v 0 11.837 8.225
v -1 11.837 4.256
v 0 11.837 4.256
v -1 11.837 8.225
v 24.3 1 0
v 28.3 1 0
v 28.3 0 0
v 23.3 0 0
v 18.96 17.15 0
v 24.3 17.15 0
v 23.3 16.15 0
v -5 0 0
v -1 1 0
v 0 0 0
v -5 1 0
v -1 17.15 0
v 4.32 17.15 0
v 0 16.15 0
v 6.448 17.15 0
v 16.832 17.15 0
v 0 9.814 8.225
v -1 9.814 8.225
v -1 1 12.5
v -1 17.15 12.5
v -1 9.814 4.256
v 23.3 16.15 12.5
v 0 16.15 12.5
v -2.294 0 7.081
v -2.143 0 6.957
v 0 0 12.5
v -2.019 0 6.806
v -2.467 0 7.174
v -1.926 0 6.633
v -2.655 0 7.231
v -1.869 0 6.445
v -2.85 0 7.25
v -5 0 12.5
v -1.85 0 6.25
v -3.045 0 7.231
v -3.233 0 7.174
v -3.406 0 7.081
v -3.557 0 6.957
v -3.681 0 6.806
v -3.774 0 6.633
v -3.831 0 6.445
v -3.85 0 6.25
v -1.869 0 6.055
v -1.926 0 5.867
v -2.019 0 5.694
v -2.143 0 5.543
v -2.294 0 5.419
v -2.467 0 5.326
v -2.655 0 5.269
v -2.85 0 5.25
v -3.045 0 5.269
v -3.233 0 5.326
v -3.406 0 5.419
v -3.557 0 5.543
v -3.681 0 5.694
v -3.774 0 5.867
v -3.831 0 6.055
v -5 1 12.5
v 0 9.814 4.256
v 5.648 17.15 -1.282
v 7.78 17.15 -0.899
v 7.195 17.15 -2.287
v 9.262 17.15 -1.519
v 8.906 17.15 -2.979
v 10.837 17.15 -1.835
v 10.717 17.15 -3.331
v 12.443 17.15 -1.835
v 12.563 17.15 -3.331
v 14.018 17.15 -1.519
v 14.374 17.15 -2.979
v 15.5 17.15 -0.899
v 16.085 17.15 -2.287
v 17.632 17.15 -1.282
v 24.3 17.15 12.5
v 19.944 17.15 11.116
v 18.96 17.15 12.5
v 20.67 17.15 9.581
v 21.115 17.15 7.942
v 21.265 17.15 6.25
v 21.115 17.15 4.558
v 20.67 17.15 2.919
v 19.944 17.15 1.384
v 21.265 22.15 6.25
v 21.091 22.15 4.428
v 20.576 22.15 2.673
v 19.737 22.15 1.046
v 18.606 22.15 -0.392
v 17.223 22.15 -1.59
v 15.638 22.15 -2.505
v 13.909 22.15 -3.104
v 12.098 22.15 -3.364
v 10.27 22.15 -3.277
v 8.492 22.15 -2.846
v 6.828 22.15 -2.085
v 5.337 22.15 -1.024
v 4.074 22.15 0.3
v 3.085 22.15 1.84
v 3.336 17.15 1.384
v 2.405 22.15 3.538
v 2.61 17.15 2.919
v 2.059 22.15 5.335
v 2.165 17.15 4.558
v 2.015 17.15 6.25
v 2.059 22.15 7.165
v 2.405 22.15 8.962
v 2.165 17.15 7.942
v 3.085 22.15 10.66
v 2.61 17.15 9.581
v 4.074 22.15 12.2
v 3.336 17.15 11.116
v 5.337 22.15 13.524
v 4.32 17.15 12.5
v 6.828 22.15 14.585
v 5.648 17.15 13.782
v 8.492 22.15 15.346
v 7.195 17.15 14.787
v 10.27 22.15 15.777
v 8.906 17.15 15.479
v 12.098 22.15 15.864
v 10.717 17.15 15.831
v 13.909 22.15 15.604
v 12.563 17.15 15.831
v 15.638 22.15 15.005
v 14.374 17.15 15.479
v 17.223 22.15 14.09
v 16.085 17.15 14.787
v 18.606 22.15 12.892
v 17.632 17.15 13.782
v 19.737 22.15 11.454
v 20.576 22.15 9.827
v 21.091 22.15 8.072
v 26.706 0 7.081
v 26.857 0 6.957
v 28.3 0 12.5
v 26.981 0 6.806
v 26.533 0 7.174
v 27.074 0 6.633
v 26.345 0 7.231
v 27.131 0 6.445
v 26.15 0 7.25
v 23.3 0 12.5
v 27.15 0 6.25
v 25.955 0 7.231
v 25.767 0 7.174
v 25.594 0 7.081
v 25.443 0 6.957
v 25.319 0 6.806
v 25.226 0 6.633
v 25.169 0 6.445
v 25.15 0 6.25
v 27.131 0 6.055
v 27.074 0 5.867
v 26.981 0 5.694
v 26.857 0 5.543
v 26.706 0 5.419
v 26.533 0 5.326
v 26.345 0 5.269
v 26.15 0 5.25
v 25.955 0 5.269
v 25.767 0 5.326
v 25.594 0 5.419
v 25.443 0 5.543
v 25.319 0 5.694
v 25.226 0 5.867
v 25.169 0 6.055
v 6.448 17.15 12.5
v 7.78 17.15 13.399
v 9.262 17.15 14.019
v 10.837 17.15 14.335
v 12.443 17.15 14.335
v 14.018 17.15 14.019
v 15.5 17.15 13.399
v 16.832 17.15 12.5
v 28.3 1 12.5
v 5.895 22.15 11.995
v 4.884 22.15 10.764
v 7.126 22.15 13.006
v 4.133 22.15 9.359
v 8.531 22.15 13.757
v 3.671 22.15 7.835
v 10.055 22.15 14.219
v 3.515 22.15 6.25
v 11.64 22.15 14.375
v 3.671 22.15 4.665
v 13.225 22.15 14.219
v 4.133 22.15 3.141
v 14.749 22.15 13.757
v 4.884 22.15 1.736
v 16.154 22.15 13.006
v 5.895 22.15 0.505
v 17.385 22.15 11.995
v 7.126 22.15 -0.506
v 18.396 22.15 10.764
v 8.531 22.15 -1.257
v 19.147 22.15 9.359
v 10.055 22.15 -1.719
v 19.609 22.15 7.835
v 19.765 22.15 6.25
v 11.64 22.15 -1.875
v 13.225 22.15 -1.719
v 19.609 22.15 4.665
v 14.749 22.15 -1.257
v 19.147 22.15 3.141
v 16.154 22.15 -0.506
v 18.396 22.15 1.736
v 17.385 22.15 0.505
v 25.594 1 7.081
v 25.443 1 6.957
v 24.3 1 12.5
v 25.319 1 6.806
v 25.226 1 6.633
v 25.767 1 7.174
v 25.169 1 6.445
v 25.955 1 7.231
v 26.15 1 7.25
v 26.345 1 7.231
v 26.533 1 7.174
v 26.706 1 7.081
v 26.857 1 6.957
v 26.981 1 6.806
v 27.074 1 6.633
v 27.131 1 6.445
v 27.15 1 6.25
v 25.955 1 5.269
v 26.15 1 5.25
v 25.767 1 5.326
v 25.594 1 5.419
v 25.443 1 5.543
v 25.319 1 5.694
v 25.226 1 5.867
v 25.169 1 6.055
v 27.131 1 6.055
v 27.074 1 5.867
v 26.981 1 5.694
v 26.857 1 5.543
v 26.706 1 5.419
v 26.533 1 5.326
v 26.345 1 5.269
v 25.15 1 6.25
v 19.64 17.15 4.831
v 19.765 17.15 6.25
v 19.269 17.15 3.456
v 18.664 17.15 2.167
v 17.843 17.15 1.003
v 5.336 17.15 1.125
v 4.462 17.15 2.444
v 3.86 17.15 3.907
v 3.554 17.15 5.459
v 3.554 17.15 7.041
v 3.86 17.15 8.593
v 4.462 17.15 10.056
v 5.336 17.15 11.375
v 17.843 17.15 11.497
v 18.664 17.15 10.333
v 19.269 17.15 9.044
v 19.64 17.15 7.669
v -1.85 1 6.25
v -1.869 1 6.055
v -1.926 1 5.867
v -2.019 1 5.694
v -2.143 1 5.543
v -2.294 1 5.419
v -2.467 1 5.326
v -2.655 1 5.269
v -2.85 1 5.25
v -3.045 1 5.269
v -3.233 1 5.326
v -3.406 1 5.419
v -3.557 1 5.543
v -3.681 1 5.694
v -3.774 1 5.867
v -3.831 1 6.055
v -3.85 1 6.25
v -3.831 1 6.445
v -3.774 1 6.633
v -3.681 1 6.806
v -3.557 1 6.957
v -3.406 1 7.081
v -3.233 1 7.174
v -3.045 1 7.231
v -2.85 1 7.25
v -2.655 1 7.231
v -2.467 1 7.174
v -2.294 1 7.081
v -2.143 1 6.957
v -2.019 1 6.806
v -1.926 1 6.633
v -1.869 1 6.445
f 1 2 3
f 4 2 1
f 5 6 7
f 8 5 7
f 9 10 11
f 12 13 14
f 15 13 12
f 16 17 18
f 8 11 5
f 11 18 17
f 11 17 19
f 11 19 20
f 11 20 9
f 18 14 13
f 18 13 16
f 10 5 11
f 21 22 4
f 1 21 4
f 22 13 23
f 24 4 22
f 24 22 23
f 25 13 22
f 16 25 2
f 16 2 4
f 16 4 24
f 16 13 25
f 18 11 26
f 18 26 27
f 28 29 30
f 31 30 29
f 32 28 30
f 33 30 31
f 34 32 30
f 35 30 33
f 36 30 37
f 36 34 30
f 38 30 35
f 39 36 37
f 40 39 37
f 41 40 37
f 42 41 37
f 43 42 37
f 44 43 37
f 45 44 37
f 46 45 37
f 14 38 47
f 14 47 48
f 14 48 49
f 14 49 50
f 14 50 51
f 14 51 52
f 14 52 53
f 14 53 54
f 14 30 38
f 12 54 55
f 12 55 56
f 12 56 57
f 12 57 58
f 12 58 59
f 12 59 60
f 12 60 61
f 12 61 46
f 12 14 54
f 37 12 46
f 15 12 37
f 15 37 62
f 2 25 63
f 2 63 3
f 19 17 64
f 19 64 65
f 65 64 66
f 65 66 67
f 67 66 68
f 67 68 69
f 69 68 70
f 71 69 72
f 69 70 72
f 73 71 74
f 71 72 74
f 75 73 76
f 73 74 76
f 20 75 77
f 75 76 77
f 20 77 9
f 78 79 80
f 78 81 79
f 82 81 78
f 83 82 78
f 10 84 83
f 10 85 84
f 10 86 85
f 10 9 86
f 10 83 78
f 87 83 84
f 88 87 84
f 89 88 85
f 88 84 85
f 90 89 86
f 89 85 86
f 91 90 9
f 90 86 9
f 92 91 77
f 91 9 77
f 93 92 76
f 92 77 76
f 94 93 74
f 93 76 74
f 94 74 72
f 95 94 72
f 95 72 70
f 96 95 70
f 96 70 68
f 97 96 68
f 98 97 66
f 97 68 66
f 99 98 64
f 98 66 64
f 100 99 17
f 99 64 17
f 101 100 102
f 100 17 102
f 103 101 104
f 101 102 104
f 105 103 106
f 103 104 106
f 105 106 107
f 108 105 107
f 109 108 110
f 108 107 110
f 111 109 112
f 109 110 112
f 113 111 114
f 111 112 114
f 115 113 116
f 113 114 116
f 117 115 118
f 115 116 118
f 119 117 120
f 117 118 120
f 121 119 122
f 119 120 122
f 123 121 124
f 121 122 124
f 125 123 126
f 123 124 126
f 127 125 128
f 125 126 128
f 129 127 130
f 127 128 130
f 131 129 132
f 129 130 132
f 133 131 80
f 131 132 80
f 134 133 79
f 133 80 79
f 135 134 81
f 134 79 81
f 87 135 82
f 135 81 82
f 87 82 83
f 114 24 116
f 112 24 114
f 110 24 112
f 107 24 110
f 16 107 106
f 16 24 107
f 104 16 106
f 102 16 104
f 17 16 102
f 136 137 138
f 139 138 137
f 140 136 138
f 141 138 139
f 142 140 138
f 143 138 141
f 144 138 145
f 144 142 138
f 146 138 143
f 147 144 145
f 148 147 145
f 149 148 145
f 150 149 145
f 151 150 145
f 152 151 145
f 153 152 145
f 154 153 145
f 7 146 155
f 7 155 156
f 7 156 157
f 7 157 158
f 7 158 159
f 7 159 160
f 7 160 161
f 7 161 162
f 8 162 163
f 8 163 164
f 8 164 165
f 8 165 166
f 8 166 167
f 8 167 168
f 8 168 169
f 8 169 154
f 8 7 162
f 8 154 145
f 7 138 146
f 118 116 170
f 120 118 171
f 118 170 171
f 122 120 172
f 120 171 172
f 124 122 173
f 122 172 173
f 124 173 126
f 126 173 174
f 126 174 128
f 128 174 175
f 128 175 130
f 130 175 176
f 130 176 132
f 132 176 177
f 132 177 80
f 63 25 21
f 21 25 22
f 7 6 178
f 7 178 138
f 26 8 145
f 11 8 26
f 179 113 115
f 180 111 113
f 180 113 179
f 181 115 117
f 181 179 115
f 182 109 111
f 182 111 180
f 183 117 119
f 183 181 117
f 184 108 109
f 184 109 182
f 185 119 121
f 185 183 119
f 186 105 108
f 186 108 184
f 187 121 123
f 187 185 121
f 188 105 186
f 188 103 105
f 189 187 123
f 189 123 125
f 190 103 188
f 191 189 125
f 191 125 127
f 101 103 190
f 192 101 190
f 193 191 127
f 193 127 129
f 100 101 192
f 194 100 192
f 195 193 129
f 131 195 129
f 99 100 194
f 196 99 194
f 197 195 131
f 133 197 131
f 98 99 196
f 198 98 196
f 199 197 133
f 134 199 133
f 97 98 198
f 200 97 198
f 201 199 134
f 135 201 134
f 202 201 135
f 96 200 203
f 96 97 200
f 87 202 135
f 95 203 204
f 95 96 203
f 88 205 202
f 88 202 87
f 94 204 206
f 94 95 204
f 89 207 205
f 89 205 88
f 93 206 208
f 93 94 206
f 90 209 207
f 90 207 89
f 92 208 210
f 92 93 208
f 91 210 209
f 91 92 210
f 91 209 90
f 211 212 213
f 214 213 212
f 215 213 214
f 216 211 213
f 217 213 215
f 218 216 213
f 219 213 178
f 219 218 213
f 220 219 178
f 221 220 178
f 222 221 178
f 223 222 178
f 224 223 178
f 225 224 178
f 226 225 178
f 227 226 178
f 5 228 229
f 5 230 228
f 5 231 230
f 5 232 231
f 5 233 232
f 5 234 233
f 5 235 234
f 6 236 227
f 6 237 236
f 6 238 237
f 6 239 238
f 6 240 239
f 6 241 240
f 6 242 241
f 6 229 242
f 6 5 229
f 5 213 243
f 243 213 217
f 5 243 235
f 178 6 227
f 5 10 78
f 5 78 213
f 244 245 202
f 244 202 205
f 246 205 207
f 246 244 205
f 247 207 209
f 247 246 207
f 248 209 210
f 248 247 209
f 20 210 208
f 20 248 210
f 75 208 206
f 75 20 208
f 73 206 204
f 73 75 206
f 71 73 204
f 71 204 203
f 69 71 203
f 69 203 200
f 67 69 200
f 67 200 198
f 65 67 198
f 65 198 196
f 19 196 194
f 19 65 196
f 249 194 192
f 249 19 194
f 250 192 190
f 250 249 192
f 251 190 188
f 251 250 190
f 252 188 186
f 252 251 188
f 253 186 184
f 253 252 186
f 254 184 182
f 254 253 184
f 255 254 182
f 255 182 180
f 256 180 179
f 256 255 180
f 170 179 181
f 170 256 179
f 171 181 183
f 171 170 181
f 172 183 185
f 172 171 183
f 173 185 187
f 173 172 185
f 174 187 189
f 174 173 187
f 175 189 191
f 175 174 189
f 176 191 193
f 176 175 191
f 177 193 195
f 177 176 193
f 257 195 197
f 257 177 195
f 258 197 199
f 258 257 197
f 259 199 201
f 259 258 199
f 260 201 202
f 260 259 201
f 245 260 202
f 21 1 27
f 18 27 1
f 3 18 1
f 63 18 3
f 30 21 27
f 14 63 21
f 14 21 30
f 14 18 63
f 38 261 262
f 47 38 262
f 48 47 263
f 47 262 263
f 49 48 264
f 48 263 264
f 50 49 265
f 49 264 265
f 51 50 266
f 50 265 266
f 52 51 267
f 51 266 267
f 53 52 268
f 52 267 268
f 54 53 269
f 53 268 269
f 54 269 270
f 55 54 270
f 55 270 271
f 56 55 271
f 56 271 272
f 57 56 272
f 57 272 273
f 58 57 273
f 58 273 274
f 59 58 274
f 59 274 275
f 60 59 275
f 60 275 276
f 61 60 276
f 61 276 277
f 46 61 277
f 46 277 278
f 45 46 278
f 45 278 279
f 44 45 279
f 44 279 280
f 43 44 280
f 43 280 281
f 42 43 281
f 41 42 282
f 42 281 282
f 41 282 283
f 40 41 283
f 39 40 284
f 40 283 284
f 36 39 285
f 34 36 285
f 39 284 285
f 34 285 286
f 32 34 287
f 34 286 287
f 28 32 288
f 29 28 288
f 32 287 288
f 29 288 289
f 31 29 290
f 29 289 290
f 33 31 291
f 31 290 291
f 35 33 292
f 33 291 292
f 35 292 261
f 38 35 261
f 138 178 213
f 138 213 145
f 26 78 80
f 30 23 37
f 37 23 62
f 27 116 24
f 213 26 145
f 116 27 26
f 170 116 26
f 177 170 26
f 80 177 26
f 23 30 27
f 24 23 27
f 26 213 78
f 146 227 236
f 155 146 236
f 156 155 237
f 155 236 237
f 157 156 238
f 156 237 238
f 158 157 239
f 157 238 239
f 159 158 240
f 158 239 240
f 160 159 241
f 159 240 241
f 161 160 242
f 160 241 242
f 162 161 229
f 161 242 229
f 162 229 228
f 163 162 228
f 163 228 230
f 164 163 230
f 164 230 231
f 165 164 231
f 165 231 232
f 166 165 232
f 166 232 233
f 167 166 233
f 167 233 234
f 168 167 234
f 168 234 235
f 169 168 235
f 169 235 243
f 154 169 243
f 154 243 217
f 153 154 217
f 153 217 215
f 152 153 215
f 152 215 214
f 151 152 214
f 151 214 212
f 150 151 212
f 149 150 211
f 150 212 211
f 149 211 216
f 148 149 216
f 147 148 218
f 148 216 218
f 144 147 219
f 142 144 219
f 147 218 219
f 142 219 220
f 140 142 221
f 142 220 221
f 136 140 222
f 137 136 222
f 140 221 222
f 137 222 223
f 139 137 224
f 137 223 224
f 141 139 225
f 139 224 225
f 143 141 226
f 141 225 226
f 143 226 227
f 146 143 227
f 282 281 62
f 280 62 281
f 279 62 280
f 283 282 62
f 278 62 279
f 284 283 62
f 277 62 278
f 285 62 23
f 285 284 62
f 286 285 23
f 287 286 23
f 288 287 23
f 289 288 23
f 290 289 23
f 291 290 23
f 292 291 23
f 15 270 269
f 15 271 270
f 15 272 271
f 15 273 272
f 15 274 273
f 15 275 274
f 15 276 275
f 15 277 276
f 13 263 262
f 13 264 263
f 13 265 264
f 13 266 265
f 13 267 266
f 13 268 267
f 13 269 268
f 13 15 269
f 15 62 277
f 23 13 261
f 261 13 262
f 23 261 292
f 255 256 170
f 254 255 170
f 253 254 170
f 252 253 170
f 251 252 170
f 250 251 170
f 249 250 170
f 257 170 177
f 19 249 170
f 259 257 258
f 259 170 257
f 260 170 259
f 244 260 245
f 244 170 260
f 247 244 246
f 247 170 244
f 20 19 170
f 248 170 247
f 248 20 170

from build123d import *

# Parameters (mm, degrees)
EKSTR_ZYON_NCE1_DEPTH       = 12.5
IZIM2_R                     = 1
KES_EKSTR_ZYON1_DEPTH       = 2
IZIM3_W                     = 3.969414418
IZIM3_H                     = 2.023180186
KES_EKSTR_ZYON2_DEPTH       = 3
IZIM4_R                     = 9.625
IZIM4_R_2                   = 8.125
Y_KSEKLIK_EKSTR_ZYON1_DEPTH = 5


with BuildPart() as part:
    # Çizim1 → Ekstrüzyon-İnce1 (new body)
    with BuildSketch(Plane.XY):
        Polygon((28.3, 0), (23.3, 0), (23.3, 16.15), (0, 16.15), (0, 0), (-5, 0), (-5, 1), (-1, 1), (-1, 17.15), (24.3, 17.15), (24.3, 1), (28.3, 1), align=None)
    extrude(amount=EKSTR_ZYON_NCE1_DEPTH)

    # Çizim2 → Kes-Ekstrüzyon1 (cut, through all)
    with BuildSketch(Plane(origin=(0, 1, 0), x_dir=(1, 0, 0), z_dir=(0, 1, 0))):
        with Locations((-2.85, -6.25)):
            Circle(IZIM2_R)
        with Locations((26.15, -6.25)):
            Circle(IZIM2_R)
    extrude(amount=-KES_EKSTR_ZYON1_DEPTH, mode=Mode.SUBTRACT)

    # Çizim3 → Kes-Ekstrüzyon2 (cut)
    with BuildSketch(Plane.ZY.offset(1)):
        with Locations((6.240510002, 10.825173076)):
            Rectangle(IZIM3_W, IZIM3_H)
    extrude(amount=-KES_EKSTR_ZYON2_DEPTH, mode=Mode.SUBTRACT)

    # Çizim4 → Yükseklik-Ekstrüzyon1 (add)
    with BuildSketch(Plane(origin=(0, 17.15, 0), x_dir=(1, 0, 0), z_dir=(0, 1, 0))):
        with Locations((11.64, -6.25)):
            Circle(IZIM4_R)
        with Locations((11.64, -6.25)):
            Circle(IZIM4_R_2, mode=Mode.SUBTRACT)
    extrude(amount=Y_KSEKLIK_EKSTR_ZYON1_DEPTH)


solid = part.part
